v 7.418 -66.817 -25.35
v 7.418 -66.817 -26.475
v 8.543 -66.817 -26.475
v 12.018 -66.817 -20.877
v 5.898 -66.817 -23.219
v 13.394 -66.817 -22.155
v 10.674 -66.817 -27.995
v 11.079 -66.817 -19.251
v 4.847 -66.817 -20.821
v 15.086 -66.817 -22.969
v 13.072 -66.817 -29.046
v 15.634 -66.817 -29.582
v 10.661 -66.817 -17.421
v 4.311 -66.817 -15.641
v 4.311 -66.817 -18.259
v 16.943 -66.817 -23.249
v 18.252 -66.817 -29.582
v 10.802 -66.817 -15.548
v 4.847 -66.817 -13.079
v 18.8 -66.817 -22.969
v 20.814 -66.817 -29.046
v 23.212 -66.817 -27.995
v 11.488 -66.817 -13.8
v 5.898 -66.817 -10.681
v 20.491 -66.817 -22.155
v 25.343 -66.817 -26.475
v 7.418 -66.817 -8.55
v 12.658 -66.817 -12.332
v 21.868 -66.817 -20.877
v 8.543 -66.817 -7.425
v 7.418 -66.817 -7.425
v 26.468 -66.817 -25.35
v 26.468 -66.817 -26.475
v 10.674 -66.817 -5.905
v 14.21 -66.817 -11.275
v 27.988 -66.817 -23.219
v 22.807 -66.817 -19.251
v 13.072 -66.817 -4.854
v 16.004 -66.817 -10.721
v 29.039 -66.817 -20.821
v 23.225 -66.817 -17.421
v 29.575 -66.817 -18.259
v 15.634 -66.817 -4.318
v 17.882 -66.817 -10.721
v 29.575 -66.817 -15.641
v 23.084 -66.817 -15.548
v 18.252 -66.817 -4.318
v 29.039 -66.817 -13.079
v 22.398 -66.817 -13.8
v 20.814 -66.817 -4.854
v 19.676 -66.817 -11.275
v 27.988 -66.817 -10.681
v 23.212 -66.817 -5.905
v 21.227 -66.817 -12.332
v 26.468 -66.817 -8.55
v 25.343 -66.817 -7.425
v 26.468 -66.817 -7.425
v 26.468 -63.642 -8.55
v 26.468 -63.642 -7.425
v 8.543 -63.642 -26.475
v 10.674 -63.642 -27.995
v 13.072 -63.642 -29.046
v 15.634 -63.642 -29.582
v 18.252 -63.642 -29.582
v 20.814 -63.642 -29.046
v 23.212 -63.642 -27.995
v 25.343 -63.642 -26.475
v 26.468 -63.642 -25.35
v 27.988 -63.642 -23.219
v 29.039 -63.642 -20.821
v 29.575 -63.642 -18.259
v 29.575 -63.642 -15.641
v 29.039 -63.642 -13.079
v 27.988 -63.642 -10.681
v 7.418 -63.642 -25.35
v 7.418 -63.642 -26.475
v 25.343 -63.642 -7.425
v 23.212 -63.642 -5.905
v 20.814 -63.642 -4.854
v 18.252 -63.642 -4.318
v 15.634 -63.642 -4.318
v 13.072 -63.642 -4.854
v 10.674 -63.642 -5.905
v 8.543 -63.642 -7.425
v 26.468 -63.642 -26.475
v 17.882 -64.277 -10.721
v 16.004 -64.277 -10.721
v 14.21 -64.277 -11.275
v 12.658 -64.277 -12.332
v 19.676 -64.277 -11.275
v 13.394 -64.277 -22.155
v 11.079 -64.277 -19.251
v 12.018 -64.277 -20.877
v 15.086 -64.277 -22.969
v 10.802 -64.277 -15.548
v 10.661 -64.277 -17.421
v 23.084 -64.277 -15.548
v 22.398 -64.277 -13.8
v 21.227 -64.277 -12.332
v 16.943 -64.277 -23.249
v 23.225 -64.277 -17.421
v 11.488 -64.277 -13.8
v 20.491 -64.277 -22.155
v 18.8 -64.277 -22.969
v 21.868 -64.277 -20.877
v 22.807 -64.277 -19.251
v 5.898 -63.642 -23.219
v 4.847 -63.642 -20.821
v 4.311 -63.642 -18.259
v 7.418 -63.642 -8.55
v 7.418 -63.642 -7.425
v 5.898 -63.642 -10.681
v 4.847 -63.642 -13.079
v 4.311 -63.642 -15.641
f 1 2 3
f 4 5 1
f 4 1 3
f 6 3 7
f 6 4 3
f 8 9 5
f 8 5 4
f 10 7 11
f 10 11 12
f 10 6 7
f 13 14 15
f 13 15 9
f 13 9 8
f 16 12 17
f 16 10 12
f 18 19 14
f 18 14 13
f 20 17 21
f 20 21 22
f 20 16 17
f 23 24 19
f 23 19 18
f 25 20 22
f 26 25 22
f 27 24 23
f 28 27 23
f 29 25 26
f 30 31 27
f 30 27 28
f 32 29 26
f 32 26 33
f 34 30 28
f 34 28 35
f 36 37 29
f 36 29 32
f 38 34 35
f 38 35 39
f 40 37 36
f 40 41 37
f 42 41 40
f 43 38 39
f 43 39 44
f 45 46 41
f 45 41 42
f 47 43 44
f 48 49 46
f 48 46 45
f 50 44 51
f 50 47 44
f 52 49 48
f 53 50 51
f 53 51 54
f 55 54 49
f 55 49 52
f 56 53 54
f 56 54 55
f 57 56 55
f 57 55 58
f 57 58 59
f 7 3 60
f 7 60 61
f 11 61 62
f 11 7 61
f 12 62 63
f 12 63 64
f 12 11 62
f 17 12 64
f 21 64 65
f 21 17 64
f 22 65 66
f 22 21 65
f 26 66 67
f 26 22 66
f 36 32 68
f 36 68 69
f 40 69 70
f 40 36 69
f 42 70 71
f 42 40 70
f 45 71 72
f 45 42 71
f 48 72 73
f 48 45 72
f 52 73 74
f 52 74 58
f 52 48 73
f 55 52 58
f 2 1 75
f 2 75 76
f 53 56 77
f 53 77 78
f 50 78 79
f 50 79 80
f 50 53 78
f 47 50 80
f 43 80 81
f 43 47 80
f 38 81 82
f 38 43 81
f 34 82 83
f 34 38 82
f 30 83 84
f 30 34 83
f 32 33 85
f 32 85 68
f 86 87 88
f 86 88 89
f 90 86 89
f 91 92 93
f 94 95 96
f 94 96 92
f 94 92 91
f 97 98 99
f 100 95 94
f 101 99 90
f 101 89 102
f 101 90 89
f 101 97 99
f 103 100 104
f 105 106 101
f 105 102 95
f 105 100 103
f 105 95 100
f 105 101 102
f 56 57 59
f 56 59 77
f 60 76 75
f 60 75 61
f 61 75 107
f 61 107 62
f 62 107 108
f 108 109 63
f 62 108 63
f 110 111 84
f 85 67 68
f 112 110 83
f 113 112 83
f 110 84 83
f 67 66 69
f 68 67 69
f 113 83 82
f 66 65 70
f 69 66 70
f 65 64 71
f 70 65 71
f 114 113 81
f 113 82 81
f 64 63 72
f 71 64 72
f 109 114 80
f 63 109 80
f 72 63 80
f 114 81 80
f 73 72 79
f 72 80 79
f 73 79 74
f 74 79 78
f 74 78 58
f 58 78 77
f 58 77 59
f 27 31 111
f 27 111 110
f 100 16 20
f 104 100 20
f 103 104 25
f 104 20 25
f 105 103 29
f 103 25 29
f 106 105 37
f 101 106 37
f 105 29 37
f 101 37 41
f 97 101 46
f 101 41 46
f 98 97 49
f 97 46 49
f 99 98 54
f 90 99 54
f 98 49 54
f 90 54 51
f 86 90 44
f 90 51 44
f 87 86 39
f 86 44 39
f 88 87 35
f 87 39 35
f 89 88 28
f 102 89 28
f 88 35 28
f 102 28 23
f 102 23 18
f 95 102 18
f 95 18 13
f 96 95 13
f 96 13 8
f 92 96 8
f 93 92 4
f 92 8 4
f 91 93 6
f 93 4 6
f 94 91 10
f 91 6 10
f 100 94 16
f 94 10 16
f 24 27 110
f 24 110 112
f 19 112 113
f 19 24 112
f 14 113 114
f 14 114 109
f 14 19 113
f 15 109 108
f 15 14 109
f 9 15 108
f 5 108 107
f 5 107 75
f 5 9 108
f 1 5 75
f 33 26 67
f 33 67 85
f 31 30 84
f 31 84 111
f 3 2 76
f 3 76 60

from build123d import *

# Parameters (mm, degrees)
BOSS_EXTRUDE1_DEPTH = 3.175
SKETCH2_R           = 6.2992
CUT_EXTRUDE1_DEPTH  = 2.54


with BuildPart() as part:
    # Sketch1 → Boss-Extrude1 (new body)
    with BuildSketch(Plane.XZ.offset(66.817157288)):
        with BuildLine():
            Line((26.467944946, -26.475), (26.467944946, -25.350260413))
            ThreePointArc((26.467944946, -25.350260413), (29.642944946, -16.95), (26.467944946, -8.549739587))
            Line((26.467944946, -8.549739587), (26.467944946, -7.425))
            Line((26.467944946, -7.425), (25.343205359, -7.425))
            ThreePointArc((25.343205359, -7.425), (16.942944946, -4.25), (8.542684533, -7.425))
            Line((8.542684533, -7.425), (7.417944946, -7.425))
            Line((7.417944946, -7.425), (7.417944946, -8.549739587))
            ThreePointArc((7.417944946, -8.549739587), (4.242944946, -16.95), (7.417944946, -25.350260413))
            Line((7.417944946, -25.350260413), (7.417944946, -26.475))
            Line((7.417944946, -26.475), (8.542684533, -26.475))
            ThreePointArc((8.542684533, -26.475), (16.942944946, -29.65), (25.343205359, -26.475))
            Line((25.343205359, -26.475), (26.467944946, -26.475))
        make_face()
    extrude(amount=-BOSS_EXTRUDE1_DEPTH)

    # Sketch2 → Cut-Extrude1 (cut)
    with BuildSketch(Plane.XZ.offset(66.817157288)):
        with Locations(Location((16.942944946, -16.95, 0), (0, 0, 270))):
            Circle(SKETCH2_R)
    extrude(amount=-CUT_EXTRUDE1_DEPTH, mode=Mode.SUBTRACT)


solid = part.part
